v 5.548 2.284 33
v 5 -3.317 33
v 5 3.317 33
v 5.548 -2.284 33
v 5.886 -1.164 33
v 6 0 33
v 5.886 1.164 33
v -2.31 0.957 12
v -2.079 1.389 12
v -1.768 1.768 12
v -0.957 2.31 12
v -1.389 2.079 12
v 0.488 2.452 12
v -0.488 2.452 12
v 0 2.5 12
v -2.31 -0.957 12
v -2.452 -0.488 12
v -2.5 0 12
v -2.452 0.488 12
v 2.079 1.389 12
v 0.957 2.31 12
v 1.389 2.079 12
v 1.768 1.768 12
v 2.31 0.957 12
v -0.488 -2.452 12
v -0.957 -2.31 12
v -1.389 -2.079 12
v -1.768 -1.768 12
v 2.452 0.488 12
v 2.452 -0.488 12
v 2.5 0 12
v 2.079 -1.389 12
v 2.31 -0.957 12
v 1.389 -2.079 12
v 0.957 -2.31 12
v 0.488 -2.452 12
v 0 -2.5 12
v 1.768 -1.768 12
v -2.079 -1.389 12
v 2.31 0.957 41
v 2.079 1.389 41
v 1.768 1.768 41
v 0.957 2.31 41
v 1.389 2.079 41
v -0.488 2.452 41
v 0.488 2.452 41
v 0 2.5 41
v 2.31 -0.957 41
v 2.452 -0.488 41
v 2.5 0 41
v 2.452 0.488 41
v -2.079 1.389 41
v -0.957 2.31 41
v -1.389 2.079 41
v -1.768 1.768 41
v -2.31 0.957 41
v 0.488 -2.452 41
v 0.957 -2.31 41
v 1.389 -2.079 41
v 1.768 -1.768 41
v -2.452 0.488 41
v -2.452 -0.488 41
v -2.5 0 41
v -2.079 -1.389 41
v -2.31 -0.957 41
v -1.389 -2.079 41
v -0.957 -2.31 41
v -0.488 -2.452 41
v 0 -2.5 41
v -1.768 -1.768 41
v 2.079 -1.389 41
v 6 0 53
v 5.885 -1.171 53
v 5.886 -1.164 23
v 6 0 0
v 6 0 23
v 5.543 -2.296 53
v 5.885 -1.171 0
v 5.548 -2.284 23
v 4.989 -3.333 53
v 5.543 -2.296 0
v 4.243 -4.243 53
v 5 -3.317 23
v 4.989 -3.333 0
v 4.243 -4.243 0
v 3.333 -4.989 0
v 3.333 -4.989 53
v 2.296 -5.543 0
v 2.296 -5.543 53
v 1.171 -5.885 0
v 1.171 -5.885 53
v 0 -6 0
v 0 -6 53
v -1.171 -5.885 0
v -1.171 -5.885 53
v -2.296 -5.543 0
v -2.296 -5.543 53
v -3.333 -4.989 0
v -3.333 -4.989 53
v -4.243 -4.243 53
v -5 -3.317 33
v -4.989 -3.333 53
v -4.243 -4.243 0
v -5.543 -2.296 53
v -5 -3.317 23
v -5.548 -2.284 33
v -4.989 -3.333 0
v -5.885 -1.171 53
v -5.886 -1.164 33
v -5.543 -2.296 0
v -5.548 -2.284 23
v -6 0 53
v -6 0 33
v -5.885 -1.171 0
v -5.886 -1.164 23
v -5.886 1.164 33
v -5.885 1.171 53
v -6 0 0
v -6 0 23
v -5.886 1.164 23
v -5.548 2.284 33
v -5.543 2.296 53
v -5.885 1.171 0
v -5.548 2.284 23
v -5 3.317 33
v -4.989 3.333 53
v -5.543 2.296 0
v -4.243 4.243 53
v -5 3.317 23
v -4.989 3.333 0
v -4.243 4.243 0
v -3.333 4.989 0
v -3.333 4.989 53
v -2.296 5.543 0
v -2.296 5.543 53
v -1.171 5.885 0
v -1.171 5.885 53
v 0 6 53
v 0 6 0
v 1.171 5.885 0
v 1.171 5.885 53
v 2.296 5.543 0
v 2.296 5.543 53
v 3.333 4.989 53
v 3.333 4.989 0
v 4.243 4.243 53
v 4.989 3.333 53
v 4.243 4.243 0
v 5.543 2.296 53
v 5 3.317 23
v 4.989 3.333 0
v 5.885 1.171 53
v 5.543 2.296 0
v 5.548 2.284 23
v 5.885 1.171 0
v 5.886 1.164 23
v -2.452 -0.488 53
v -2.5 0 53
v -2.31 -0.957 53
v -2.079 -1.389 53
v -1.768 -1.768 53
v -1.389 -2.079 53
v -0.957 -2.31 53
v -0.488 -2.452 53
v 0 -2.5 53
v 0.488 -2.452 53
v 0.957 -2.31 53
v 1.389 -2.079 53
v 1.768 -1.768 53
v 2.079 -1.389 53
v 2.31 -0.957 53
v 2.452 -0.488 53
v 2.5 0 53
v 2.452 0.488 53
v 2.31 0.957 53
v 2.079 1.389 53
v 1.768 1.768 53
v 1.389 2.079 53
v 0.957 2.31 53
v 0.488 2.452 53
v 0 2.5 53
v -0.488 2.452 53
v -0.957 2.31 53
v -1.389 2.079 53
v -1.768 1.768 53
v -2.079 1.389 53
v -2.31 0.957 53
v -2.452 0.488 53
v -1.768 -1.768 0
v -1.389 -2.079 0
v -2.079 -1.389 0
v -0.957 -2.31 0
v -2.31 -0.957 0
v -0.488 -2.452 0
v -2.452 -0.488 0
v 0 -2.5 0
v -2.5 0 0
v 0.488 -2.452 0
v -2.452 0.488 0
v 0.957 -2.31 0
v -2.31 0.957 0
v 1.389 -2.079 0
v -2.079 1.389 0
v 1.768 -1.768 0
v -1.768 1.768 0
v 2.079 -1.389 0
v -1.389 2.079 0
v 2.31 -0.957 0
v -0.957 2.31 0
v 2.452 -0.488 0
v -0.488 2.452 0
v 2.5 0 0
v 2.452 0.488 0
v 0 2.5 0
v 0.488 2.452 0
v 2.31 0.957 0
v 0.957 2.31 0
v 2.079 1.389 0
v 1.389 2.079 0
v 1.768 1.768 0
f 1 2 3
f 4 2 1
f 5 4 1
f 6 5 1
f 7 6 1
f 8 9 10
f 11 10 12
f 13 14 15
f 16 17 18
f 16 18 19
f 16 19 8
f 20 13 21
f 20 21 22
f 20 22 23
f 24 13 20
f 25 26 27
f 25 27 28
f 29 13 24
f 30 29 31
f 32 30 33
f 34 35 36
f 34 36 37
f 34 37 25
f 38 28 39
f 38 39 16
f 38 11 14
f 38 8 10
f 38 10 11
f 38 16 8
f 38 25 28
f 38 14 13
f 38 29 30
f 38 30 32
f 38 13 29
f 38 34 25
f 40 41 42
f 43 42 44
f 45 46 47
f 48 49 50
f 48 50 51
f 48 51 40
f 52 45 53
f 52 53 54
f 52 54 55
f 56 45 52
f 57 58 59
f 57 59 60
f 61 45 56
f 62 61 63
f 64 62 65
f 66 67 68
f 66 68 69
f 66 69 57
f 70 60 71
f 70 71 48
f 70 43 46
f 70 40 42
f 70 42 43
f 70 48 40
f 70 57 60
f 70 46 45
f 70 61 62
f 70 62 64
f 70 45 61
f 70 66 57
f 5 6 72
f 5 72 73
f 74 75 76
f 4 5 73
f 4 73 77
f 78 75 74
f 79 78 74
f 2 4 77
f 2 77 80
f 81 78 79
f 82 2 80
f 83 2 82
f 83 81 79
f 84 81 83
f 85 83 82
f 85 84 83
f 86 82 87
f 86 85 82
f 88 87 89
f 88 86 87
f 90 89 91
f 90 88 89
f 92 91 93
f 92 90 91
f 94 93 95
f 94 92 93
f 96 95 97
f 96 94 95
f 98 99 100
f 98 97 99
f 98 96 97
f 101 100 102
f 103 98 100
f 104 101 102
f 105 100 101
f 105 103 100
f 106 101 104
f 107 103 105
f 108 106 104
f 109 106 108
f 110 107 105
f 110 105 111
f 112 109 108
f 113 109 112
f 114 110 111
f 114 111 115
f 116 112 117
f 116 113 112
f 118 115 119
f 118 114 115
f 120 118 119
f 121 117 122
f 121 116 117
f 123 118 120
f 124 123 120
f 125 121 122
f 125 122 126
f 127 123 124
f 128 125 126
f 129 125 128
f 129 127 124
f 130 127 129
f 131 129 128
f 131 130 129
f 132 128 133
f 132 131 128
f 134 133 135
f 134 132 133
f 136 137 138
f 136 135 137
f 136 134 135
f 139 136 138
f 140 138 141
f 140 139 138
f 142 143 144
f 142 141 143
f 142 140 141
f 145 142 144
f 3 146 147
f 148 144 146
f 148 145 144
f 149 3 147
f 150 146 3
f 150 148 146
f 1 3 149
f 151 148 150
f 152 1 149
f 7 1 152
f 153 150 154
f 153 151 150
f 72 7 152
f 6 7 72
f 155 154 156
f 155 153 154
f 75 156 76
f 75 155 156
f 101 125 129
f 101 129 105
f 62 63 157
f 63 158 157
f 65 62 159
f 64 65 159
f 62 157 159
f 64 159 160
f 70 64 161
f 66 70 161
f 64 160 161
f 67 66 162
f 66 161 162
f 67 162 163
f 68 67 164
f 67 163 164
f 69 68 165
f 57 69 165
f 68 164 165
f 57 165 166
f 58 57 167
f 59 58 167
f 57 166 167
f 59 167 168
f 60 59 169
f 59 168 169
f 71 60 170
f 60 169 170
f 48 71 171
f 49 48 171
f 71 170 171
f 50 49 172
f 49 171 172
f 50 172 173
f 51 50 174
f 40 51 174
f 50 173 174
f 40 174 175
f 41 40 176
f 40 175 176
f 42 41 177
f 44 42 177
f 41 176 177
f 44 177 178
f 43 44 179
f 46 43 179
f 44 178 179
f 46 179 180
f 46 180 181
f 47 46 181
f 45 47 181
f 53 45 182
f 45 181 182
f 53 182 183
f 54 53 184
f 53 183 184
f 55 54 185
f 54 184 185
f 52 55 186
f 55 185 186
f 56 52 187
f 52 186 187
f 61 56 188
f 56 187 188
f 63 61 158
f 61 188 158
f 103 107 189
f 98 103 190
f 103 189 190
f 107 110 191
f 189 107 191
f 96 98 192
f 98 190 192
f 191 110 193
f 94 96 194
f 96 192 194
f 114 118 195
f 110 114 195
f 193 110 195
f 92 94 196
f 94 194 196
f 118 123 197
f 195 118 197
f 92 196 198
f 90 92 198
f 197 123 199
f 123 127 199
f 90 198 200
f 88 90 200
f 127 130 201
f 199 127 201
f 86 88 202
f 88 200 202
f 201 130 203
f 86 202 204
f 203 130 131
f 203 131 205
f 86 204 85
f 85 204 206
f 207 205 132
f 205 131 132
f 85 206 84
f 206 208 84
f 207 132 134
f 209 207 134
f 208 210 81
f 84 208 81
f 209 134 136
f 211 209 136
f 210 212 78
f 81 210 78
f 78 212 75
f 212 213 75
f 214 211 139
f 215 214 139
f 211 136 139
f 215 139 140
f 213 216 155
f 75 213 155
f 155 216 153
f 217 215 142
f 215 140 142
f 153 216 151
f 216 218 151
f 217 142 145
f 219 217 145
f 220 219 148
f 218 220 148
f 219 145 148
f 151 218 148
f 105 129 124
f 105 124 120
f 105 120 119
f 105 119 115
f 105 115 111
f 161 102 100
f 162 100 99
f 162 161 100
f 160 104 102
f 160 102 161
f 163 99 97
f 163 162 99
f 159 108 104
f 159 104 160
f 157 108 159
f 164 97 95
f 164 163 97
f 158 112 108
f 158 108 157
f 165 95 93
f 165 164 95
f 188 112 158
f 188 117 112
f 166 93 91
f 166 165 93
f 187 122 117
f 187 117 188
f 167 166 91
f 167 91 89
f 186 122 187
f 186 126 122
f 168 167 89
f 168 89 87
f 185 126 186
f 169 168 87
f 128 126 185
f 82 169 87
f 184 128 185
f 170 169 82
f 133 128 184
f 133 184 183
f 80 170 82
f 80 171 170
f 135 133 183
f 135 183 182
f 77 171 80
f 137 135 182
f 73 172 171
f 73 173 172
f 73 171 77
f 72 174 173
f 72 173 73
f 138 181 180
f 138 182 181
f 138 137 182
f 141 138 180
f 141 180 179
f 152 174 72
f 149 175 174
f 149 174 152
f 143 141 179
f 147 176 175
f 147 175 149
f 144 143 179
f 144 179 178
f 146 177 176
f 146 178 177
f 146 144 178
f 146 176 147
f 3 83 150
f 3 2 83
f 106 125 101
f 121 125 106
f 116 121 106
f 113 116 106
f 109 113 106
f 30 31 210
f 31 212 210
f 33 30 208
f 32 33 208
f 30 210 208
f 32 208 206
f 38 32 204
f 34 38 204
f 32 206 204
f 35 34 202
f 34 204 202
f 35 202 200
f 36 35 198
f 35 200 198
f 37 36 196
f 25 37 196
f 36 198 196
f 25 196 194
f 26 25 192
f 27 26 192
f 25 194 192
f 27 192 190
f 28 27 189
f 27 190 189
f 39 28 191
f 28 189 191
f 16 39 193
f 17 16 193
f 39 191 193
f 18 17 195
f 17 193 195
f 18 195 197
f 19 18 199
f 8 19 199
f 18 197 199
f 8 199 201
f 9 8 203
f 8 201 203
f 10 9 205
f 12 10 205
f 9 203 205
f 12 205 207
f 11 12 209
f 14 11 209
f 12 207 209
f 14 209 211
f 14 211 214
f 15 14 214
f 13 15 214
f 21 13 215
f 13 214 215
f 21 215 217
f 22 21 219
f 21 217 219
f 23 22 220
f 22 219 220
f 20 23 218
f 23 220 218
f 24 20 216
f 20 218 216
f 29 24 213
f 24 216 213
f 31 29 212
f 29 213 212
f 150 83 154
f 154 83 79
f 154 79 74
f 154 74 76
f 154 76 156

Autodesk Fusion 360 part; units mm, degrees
sketch "Esquisse1" plane through (0, 0, 0) normal (0, 0, 1) x (1, 0, 0)
  circle A0 centre (0, 0) radius 6
  dimension "d1" = 12
extrude "Extrusion1" add sketch "Esquisse1" along normal blind 53
sketch "Esquisse2" plane through (0, 0, 53) normal (0, 0, 1) x (-1, 0, 0)
  circle A0 centre (0, 0) radius 6
  circle A1 centre (0, 0) radius 2.5
  dimension "d5" = 5
extrude "Extrusion2" cut sketch "Esquisse2" against normal blind 12 contours A1
sketch "Esquisse3" plane through (0, 0, 0) normal (0, 0, -1) x (1, 0, 0)
  circle A0 centre (0, 0) radius 6
  circle A1 centre (0, 0) radius 2.5
  dimension "d8" = 5
extrude "Extrusion3" cut sketch "Esquisse3" against normal blind 12 contours A1
sketch "Esquisse4" plane through (0, 0, 53) normal (0, 0, 1) x (-1, 0, 0)
  circle A0 centre (0, 0) radius 2.5
  circle A1 centre (0, 0) radius 6
  line L0 (5, 8) -> (-5, 8)
  line L1 (-5, 8) -> (-5, -7.4606)
  line L2 (-5, -7.4606) -> (5, -7.4606)
  line L3 (5, -7.4606) -> (5, 8)
  dimension "d11" = 5
  dimension "d12" = 10
extrude "Extrusion4" cut sketch "Esquisse4" against normal blind 10 from surface at -20 contours A1 L3 | A1 L1
